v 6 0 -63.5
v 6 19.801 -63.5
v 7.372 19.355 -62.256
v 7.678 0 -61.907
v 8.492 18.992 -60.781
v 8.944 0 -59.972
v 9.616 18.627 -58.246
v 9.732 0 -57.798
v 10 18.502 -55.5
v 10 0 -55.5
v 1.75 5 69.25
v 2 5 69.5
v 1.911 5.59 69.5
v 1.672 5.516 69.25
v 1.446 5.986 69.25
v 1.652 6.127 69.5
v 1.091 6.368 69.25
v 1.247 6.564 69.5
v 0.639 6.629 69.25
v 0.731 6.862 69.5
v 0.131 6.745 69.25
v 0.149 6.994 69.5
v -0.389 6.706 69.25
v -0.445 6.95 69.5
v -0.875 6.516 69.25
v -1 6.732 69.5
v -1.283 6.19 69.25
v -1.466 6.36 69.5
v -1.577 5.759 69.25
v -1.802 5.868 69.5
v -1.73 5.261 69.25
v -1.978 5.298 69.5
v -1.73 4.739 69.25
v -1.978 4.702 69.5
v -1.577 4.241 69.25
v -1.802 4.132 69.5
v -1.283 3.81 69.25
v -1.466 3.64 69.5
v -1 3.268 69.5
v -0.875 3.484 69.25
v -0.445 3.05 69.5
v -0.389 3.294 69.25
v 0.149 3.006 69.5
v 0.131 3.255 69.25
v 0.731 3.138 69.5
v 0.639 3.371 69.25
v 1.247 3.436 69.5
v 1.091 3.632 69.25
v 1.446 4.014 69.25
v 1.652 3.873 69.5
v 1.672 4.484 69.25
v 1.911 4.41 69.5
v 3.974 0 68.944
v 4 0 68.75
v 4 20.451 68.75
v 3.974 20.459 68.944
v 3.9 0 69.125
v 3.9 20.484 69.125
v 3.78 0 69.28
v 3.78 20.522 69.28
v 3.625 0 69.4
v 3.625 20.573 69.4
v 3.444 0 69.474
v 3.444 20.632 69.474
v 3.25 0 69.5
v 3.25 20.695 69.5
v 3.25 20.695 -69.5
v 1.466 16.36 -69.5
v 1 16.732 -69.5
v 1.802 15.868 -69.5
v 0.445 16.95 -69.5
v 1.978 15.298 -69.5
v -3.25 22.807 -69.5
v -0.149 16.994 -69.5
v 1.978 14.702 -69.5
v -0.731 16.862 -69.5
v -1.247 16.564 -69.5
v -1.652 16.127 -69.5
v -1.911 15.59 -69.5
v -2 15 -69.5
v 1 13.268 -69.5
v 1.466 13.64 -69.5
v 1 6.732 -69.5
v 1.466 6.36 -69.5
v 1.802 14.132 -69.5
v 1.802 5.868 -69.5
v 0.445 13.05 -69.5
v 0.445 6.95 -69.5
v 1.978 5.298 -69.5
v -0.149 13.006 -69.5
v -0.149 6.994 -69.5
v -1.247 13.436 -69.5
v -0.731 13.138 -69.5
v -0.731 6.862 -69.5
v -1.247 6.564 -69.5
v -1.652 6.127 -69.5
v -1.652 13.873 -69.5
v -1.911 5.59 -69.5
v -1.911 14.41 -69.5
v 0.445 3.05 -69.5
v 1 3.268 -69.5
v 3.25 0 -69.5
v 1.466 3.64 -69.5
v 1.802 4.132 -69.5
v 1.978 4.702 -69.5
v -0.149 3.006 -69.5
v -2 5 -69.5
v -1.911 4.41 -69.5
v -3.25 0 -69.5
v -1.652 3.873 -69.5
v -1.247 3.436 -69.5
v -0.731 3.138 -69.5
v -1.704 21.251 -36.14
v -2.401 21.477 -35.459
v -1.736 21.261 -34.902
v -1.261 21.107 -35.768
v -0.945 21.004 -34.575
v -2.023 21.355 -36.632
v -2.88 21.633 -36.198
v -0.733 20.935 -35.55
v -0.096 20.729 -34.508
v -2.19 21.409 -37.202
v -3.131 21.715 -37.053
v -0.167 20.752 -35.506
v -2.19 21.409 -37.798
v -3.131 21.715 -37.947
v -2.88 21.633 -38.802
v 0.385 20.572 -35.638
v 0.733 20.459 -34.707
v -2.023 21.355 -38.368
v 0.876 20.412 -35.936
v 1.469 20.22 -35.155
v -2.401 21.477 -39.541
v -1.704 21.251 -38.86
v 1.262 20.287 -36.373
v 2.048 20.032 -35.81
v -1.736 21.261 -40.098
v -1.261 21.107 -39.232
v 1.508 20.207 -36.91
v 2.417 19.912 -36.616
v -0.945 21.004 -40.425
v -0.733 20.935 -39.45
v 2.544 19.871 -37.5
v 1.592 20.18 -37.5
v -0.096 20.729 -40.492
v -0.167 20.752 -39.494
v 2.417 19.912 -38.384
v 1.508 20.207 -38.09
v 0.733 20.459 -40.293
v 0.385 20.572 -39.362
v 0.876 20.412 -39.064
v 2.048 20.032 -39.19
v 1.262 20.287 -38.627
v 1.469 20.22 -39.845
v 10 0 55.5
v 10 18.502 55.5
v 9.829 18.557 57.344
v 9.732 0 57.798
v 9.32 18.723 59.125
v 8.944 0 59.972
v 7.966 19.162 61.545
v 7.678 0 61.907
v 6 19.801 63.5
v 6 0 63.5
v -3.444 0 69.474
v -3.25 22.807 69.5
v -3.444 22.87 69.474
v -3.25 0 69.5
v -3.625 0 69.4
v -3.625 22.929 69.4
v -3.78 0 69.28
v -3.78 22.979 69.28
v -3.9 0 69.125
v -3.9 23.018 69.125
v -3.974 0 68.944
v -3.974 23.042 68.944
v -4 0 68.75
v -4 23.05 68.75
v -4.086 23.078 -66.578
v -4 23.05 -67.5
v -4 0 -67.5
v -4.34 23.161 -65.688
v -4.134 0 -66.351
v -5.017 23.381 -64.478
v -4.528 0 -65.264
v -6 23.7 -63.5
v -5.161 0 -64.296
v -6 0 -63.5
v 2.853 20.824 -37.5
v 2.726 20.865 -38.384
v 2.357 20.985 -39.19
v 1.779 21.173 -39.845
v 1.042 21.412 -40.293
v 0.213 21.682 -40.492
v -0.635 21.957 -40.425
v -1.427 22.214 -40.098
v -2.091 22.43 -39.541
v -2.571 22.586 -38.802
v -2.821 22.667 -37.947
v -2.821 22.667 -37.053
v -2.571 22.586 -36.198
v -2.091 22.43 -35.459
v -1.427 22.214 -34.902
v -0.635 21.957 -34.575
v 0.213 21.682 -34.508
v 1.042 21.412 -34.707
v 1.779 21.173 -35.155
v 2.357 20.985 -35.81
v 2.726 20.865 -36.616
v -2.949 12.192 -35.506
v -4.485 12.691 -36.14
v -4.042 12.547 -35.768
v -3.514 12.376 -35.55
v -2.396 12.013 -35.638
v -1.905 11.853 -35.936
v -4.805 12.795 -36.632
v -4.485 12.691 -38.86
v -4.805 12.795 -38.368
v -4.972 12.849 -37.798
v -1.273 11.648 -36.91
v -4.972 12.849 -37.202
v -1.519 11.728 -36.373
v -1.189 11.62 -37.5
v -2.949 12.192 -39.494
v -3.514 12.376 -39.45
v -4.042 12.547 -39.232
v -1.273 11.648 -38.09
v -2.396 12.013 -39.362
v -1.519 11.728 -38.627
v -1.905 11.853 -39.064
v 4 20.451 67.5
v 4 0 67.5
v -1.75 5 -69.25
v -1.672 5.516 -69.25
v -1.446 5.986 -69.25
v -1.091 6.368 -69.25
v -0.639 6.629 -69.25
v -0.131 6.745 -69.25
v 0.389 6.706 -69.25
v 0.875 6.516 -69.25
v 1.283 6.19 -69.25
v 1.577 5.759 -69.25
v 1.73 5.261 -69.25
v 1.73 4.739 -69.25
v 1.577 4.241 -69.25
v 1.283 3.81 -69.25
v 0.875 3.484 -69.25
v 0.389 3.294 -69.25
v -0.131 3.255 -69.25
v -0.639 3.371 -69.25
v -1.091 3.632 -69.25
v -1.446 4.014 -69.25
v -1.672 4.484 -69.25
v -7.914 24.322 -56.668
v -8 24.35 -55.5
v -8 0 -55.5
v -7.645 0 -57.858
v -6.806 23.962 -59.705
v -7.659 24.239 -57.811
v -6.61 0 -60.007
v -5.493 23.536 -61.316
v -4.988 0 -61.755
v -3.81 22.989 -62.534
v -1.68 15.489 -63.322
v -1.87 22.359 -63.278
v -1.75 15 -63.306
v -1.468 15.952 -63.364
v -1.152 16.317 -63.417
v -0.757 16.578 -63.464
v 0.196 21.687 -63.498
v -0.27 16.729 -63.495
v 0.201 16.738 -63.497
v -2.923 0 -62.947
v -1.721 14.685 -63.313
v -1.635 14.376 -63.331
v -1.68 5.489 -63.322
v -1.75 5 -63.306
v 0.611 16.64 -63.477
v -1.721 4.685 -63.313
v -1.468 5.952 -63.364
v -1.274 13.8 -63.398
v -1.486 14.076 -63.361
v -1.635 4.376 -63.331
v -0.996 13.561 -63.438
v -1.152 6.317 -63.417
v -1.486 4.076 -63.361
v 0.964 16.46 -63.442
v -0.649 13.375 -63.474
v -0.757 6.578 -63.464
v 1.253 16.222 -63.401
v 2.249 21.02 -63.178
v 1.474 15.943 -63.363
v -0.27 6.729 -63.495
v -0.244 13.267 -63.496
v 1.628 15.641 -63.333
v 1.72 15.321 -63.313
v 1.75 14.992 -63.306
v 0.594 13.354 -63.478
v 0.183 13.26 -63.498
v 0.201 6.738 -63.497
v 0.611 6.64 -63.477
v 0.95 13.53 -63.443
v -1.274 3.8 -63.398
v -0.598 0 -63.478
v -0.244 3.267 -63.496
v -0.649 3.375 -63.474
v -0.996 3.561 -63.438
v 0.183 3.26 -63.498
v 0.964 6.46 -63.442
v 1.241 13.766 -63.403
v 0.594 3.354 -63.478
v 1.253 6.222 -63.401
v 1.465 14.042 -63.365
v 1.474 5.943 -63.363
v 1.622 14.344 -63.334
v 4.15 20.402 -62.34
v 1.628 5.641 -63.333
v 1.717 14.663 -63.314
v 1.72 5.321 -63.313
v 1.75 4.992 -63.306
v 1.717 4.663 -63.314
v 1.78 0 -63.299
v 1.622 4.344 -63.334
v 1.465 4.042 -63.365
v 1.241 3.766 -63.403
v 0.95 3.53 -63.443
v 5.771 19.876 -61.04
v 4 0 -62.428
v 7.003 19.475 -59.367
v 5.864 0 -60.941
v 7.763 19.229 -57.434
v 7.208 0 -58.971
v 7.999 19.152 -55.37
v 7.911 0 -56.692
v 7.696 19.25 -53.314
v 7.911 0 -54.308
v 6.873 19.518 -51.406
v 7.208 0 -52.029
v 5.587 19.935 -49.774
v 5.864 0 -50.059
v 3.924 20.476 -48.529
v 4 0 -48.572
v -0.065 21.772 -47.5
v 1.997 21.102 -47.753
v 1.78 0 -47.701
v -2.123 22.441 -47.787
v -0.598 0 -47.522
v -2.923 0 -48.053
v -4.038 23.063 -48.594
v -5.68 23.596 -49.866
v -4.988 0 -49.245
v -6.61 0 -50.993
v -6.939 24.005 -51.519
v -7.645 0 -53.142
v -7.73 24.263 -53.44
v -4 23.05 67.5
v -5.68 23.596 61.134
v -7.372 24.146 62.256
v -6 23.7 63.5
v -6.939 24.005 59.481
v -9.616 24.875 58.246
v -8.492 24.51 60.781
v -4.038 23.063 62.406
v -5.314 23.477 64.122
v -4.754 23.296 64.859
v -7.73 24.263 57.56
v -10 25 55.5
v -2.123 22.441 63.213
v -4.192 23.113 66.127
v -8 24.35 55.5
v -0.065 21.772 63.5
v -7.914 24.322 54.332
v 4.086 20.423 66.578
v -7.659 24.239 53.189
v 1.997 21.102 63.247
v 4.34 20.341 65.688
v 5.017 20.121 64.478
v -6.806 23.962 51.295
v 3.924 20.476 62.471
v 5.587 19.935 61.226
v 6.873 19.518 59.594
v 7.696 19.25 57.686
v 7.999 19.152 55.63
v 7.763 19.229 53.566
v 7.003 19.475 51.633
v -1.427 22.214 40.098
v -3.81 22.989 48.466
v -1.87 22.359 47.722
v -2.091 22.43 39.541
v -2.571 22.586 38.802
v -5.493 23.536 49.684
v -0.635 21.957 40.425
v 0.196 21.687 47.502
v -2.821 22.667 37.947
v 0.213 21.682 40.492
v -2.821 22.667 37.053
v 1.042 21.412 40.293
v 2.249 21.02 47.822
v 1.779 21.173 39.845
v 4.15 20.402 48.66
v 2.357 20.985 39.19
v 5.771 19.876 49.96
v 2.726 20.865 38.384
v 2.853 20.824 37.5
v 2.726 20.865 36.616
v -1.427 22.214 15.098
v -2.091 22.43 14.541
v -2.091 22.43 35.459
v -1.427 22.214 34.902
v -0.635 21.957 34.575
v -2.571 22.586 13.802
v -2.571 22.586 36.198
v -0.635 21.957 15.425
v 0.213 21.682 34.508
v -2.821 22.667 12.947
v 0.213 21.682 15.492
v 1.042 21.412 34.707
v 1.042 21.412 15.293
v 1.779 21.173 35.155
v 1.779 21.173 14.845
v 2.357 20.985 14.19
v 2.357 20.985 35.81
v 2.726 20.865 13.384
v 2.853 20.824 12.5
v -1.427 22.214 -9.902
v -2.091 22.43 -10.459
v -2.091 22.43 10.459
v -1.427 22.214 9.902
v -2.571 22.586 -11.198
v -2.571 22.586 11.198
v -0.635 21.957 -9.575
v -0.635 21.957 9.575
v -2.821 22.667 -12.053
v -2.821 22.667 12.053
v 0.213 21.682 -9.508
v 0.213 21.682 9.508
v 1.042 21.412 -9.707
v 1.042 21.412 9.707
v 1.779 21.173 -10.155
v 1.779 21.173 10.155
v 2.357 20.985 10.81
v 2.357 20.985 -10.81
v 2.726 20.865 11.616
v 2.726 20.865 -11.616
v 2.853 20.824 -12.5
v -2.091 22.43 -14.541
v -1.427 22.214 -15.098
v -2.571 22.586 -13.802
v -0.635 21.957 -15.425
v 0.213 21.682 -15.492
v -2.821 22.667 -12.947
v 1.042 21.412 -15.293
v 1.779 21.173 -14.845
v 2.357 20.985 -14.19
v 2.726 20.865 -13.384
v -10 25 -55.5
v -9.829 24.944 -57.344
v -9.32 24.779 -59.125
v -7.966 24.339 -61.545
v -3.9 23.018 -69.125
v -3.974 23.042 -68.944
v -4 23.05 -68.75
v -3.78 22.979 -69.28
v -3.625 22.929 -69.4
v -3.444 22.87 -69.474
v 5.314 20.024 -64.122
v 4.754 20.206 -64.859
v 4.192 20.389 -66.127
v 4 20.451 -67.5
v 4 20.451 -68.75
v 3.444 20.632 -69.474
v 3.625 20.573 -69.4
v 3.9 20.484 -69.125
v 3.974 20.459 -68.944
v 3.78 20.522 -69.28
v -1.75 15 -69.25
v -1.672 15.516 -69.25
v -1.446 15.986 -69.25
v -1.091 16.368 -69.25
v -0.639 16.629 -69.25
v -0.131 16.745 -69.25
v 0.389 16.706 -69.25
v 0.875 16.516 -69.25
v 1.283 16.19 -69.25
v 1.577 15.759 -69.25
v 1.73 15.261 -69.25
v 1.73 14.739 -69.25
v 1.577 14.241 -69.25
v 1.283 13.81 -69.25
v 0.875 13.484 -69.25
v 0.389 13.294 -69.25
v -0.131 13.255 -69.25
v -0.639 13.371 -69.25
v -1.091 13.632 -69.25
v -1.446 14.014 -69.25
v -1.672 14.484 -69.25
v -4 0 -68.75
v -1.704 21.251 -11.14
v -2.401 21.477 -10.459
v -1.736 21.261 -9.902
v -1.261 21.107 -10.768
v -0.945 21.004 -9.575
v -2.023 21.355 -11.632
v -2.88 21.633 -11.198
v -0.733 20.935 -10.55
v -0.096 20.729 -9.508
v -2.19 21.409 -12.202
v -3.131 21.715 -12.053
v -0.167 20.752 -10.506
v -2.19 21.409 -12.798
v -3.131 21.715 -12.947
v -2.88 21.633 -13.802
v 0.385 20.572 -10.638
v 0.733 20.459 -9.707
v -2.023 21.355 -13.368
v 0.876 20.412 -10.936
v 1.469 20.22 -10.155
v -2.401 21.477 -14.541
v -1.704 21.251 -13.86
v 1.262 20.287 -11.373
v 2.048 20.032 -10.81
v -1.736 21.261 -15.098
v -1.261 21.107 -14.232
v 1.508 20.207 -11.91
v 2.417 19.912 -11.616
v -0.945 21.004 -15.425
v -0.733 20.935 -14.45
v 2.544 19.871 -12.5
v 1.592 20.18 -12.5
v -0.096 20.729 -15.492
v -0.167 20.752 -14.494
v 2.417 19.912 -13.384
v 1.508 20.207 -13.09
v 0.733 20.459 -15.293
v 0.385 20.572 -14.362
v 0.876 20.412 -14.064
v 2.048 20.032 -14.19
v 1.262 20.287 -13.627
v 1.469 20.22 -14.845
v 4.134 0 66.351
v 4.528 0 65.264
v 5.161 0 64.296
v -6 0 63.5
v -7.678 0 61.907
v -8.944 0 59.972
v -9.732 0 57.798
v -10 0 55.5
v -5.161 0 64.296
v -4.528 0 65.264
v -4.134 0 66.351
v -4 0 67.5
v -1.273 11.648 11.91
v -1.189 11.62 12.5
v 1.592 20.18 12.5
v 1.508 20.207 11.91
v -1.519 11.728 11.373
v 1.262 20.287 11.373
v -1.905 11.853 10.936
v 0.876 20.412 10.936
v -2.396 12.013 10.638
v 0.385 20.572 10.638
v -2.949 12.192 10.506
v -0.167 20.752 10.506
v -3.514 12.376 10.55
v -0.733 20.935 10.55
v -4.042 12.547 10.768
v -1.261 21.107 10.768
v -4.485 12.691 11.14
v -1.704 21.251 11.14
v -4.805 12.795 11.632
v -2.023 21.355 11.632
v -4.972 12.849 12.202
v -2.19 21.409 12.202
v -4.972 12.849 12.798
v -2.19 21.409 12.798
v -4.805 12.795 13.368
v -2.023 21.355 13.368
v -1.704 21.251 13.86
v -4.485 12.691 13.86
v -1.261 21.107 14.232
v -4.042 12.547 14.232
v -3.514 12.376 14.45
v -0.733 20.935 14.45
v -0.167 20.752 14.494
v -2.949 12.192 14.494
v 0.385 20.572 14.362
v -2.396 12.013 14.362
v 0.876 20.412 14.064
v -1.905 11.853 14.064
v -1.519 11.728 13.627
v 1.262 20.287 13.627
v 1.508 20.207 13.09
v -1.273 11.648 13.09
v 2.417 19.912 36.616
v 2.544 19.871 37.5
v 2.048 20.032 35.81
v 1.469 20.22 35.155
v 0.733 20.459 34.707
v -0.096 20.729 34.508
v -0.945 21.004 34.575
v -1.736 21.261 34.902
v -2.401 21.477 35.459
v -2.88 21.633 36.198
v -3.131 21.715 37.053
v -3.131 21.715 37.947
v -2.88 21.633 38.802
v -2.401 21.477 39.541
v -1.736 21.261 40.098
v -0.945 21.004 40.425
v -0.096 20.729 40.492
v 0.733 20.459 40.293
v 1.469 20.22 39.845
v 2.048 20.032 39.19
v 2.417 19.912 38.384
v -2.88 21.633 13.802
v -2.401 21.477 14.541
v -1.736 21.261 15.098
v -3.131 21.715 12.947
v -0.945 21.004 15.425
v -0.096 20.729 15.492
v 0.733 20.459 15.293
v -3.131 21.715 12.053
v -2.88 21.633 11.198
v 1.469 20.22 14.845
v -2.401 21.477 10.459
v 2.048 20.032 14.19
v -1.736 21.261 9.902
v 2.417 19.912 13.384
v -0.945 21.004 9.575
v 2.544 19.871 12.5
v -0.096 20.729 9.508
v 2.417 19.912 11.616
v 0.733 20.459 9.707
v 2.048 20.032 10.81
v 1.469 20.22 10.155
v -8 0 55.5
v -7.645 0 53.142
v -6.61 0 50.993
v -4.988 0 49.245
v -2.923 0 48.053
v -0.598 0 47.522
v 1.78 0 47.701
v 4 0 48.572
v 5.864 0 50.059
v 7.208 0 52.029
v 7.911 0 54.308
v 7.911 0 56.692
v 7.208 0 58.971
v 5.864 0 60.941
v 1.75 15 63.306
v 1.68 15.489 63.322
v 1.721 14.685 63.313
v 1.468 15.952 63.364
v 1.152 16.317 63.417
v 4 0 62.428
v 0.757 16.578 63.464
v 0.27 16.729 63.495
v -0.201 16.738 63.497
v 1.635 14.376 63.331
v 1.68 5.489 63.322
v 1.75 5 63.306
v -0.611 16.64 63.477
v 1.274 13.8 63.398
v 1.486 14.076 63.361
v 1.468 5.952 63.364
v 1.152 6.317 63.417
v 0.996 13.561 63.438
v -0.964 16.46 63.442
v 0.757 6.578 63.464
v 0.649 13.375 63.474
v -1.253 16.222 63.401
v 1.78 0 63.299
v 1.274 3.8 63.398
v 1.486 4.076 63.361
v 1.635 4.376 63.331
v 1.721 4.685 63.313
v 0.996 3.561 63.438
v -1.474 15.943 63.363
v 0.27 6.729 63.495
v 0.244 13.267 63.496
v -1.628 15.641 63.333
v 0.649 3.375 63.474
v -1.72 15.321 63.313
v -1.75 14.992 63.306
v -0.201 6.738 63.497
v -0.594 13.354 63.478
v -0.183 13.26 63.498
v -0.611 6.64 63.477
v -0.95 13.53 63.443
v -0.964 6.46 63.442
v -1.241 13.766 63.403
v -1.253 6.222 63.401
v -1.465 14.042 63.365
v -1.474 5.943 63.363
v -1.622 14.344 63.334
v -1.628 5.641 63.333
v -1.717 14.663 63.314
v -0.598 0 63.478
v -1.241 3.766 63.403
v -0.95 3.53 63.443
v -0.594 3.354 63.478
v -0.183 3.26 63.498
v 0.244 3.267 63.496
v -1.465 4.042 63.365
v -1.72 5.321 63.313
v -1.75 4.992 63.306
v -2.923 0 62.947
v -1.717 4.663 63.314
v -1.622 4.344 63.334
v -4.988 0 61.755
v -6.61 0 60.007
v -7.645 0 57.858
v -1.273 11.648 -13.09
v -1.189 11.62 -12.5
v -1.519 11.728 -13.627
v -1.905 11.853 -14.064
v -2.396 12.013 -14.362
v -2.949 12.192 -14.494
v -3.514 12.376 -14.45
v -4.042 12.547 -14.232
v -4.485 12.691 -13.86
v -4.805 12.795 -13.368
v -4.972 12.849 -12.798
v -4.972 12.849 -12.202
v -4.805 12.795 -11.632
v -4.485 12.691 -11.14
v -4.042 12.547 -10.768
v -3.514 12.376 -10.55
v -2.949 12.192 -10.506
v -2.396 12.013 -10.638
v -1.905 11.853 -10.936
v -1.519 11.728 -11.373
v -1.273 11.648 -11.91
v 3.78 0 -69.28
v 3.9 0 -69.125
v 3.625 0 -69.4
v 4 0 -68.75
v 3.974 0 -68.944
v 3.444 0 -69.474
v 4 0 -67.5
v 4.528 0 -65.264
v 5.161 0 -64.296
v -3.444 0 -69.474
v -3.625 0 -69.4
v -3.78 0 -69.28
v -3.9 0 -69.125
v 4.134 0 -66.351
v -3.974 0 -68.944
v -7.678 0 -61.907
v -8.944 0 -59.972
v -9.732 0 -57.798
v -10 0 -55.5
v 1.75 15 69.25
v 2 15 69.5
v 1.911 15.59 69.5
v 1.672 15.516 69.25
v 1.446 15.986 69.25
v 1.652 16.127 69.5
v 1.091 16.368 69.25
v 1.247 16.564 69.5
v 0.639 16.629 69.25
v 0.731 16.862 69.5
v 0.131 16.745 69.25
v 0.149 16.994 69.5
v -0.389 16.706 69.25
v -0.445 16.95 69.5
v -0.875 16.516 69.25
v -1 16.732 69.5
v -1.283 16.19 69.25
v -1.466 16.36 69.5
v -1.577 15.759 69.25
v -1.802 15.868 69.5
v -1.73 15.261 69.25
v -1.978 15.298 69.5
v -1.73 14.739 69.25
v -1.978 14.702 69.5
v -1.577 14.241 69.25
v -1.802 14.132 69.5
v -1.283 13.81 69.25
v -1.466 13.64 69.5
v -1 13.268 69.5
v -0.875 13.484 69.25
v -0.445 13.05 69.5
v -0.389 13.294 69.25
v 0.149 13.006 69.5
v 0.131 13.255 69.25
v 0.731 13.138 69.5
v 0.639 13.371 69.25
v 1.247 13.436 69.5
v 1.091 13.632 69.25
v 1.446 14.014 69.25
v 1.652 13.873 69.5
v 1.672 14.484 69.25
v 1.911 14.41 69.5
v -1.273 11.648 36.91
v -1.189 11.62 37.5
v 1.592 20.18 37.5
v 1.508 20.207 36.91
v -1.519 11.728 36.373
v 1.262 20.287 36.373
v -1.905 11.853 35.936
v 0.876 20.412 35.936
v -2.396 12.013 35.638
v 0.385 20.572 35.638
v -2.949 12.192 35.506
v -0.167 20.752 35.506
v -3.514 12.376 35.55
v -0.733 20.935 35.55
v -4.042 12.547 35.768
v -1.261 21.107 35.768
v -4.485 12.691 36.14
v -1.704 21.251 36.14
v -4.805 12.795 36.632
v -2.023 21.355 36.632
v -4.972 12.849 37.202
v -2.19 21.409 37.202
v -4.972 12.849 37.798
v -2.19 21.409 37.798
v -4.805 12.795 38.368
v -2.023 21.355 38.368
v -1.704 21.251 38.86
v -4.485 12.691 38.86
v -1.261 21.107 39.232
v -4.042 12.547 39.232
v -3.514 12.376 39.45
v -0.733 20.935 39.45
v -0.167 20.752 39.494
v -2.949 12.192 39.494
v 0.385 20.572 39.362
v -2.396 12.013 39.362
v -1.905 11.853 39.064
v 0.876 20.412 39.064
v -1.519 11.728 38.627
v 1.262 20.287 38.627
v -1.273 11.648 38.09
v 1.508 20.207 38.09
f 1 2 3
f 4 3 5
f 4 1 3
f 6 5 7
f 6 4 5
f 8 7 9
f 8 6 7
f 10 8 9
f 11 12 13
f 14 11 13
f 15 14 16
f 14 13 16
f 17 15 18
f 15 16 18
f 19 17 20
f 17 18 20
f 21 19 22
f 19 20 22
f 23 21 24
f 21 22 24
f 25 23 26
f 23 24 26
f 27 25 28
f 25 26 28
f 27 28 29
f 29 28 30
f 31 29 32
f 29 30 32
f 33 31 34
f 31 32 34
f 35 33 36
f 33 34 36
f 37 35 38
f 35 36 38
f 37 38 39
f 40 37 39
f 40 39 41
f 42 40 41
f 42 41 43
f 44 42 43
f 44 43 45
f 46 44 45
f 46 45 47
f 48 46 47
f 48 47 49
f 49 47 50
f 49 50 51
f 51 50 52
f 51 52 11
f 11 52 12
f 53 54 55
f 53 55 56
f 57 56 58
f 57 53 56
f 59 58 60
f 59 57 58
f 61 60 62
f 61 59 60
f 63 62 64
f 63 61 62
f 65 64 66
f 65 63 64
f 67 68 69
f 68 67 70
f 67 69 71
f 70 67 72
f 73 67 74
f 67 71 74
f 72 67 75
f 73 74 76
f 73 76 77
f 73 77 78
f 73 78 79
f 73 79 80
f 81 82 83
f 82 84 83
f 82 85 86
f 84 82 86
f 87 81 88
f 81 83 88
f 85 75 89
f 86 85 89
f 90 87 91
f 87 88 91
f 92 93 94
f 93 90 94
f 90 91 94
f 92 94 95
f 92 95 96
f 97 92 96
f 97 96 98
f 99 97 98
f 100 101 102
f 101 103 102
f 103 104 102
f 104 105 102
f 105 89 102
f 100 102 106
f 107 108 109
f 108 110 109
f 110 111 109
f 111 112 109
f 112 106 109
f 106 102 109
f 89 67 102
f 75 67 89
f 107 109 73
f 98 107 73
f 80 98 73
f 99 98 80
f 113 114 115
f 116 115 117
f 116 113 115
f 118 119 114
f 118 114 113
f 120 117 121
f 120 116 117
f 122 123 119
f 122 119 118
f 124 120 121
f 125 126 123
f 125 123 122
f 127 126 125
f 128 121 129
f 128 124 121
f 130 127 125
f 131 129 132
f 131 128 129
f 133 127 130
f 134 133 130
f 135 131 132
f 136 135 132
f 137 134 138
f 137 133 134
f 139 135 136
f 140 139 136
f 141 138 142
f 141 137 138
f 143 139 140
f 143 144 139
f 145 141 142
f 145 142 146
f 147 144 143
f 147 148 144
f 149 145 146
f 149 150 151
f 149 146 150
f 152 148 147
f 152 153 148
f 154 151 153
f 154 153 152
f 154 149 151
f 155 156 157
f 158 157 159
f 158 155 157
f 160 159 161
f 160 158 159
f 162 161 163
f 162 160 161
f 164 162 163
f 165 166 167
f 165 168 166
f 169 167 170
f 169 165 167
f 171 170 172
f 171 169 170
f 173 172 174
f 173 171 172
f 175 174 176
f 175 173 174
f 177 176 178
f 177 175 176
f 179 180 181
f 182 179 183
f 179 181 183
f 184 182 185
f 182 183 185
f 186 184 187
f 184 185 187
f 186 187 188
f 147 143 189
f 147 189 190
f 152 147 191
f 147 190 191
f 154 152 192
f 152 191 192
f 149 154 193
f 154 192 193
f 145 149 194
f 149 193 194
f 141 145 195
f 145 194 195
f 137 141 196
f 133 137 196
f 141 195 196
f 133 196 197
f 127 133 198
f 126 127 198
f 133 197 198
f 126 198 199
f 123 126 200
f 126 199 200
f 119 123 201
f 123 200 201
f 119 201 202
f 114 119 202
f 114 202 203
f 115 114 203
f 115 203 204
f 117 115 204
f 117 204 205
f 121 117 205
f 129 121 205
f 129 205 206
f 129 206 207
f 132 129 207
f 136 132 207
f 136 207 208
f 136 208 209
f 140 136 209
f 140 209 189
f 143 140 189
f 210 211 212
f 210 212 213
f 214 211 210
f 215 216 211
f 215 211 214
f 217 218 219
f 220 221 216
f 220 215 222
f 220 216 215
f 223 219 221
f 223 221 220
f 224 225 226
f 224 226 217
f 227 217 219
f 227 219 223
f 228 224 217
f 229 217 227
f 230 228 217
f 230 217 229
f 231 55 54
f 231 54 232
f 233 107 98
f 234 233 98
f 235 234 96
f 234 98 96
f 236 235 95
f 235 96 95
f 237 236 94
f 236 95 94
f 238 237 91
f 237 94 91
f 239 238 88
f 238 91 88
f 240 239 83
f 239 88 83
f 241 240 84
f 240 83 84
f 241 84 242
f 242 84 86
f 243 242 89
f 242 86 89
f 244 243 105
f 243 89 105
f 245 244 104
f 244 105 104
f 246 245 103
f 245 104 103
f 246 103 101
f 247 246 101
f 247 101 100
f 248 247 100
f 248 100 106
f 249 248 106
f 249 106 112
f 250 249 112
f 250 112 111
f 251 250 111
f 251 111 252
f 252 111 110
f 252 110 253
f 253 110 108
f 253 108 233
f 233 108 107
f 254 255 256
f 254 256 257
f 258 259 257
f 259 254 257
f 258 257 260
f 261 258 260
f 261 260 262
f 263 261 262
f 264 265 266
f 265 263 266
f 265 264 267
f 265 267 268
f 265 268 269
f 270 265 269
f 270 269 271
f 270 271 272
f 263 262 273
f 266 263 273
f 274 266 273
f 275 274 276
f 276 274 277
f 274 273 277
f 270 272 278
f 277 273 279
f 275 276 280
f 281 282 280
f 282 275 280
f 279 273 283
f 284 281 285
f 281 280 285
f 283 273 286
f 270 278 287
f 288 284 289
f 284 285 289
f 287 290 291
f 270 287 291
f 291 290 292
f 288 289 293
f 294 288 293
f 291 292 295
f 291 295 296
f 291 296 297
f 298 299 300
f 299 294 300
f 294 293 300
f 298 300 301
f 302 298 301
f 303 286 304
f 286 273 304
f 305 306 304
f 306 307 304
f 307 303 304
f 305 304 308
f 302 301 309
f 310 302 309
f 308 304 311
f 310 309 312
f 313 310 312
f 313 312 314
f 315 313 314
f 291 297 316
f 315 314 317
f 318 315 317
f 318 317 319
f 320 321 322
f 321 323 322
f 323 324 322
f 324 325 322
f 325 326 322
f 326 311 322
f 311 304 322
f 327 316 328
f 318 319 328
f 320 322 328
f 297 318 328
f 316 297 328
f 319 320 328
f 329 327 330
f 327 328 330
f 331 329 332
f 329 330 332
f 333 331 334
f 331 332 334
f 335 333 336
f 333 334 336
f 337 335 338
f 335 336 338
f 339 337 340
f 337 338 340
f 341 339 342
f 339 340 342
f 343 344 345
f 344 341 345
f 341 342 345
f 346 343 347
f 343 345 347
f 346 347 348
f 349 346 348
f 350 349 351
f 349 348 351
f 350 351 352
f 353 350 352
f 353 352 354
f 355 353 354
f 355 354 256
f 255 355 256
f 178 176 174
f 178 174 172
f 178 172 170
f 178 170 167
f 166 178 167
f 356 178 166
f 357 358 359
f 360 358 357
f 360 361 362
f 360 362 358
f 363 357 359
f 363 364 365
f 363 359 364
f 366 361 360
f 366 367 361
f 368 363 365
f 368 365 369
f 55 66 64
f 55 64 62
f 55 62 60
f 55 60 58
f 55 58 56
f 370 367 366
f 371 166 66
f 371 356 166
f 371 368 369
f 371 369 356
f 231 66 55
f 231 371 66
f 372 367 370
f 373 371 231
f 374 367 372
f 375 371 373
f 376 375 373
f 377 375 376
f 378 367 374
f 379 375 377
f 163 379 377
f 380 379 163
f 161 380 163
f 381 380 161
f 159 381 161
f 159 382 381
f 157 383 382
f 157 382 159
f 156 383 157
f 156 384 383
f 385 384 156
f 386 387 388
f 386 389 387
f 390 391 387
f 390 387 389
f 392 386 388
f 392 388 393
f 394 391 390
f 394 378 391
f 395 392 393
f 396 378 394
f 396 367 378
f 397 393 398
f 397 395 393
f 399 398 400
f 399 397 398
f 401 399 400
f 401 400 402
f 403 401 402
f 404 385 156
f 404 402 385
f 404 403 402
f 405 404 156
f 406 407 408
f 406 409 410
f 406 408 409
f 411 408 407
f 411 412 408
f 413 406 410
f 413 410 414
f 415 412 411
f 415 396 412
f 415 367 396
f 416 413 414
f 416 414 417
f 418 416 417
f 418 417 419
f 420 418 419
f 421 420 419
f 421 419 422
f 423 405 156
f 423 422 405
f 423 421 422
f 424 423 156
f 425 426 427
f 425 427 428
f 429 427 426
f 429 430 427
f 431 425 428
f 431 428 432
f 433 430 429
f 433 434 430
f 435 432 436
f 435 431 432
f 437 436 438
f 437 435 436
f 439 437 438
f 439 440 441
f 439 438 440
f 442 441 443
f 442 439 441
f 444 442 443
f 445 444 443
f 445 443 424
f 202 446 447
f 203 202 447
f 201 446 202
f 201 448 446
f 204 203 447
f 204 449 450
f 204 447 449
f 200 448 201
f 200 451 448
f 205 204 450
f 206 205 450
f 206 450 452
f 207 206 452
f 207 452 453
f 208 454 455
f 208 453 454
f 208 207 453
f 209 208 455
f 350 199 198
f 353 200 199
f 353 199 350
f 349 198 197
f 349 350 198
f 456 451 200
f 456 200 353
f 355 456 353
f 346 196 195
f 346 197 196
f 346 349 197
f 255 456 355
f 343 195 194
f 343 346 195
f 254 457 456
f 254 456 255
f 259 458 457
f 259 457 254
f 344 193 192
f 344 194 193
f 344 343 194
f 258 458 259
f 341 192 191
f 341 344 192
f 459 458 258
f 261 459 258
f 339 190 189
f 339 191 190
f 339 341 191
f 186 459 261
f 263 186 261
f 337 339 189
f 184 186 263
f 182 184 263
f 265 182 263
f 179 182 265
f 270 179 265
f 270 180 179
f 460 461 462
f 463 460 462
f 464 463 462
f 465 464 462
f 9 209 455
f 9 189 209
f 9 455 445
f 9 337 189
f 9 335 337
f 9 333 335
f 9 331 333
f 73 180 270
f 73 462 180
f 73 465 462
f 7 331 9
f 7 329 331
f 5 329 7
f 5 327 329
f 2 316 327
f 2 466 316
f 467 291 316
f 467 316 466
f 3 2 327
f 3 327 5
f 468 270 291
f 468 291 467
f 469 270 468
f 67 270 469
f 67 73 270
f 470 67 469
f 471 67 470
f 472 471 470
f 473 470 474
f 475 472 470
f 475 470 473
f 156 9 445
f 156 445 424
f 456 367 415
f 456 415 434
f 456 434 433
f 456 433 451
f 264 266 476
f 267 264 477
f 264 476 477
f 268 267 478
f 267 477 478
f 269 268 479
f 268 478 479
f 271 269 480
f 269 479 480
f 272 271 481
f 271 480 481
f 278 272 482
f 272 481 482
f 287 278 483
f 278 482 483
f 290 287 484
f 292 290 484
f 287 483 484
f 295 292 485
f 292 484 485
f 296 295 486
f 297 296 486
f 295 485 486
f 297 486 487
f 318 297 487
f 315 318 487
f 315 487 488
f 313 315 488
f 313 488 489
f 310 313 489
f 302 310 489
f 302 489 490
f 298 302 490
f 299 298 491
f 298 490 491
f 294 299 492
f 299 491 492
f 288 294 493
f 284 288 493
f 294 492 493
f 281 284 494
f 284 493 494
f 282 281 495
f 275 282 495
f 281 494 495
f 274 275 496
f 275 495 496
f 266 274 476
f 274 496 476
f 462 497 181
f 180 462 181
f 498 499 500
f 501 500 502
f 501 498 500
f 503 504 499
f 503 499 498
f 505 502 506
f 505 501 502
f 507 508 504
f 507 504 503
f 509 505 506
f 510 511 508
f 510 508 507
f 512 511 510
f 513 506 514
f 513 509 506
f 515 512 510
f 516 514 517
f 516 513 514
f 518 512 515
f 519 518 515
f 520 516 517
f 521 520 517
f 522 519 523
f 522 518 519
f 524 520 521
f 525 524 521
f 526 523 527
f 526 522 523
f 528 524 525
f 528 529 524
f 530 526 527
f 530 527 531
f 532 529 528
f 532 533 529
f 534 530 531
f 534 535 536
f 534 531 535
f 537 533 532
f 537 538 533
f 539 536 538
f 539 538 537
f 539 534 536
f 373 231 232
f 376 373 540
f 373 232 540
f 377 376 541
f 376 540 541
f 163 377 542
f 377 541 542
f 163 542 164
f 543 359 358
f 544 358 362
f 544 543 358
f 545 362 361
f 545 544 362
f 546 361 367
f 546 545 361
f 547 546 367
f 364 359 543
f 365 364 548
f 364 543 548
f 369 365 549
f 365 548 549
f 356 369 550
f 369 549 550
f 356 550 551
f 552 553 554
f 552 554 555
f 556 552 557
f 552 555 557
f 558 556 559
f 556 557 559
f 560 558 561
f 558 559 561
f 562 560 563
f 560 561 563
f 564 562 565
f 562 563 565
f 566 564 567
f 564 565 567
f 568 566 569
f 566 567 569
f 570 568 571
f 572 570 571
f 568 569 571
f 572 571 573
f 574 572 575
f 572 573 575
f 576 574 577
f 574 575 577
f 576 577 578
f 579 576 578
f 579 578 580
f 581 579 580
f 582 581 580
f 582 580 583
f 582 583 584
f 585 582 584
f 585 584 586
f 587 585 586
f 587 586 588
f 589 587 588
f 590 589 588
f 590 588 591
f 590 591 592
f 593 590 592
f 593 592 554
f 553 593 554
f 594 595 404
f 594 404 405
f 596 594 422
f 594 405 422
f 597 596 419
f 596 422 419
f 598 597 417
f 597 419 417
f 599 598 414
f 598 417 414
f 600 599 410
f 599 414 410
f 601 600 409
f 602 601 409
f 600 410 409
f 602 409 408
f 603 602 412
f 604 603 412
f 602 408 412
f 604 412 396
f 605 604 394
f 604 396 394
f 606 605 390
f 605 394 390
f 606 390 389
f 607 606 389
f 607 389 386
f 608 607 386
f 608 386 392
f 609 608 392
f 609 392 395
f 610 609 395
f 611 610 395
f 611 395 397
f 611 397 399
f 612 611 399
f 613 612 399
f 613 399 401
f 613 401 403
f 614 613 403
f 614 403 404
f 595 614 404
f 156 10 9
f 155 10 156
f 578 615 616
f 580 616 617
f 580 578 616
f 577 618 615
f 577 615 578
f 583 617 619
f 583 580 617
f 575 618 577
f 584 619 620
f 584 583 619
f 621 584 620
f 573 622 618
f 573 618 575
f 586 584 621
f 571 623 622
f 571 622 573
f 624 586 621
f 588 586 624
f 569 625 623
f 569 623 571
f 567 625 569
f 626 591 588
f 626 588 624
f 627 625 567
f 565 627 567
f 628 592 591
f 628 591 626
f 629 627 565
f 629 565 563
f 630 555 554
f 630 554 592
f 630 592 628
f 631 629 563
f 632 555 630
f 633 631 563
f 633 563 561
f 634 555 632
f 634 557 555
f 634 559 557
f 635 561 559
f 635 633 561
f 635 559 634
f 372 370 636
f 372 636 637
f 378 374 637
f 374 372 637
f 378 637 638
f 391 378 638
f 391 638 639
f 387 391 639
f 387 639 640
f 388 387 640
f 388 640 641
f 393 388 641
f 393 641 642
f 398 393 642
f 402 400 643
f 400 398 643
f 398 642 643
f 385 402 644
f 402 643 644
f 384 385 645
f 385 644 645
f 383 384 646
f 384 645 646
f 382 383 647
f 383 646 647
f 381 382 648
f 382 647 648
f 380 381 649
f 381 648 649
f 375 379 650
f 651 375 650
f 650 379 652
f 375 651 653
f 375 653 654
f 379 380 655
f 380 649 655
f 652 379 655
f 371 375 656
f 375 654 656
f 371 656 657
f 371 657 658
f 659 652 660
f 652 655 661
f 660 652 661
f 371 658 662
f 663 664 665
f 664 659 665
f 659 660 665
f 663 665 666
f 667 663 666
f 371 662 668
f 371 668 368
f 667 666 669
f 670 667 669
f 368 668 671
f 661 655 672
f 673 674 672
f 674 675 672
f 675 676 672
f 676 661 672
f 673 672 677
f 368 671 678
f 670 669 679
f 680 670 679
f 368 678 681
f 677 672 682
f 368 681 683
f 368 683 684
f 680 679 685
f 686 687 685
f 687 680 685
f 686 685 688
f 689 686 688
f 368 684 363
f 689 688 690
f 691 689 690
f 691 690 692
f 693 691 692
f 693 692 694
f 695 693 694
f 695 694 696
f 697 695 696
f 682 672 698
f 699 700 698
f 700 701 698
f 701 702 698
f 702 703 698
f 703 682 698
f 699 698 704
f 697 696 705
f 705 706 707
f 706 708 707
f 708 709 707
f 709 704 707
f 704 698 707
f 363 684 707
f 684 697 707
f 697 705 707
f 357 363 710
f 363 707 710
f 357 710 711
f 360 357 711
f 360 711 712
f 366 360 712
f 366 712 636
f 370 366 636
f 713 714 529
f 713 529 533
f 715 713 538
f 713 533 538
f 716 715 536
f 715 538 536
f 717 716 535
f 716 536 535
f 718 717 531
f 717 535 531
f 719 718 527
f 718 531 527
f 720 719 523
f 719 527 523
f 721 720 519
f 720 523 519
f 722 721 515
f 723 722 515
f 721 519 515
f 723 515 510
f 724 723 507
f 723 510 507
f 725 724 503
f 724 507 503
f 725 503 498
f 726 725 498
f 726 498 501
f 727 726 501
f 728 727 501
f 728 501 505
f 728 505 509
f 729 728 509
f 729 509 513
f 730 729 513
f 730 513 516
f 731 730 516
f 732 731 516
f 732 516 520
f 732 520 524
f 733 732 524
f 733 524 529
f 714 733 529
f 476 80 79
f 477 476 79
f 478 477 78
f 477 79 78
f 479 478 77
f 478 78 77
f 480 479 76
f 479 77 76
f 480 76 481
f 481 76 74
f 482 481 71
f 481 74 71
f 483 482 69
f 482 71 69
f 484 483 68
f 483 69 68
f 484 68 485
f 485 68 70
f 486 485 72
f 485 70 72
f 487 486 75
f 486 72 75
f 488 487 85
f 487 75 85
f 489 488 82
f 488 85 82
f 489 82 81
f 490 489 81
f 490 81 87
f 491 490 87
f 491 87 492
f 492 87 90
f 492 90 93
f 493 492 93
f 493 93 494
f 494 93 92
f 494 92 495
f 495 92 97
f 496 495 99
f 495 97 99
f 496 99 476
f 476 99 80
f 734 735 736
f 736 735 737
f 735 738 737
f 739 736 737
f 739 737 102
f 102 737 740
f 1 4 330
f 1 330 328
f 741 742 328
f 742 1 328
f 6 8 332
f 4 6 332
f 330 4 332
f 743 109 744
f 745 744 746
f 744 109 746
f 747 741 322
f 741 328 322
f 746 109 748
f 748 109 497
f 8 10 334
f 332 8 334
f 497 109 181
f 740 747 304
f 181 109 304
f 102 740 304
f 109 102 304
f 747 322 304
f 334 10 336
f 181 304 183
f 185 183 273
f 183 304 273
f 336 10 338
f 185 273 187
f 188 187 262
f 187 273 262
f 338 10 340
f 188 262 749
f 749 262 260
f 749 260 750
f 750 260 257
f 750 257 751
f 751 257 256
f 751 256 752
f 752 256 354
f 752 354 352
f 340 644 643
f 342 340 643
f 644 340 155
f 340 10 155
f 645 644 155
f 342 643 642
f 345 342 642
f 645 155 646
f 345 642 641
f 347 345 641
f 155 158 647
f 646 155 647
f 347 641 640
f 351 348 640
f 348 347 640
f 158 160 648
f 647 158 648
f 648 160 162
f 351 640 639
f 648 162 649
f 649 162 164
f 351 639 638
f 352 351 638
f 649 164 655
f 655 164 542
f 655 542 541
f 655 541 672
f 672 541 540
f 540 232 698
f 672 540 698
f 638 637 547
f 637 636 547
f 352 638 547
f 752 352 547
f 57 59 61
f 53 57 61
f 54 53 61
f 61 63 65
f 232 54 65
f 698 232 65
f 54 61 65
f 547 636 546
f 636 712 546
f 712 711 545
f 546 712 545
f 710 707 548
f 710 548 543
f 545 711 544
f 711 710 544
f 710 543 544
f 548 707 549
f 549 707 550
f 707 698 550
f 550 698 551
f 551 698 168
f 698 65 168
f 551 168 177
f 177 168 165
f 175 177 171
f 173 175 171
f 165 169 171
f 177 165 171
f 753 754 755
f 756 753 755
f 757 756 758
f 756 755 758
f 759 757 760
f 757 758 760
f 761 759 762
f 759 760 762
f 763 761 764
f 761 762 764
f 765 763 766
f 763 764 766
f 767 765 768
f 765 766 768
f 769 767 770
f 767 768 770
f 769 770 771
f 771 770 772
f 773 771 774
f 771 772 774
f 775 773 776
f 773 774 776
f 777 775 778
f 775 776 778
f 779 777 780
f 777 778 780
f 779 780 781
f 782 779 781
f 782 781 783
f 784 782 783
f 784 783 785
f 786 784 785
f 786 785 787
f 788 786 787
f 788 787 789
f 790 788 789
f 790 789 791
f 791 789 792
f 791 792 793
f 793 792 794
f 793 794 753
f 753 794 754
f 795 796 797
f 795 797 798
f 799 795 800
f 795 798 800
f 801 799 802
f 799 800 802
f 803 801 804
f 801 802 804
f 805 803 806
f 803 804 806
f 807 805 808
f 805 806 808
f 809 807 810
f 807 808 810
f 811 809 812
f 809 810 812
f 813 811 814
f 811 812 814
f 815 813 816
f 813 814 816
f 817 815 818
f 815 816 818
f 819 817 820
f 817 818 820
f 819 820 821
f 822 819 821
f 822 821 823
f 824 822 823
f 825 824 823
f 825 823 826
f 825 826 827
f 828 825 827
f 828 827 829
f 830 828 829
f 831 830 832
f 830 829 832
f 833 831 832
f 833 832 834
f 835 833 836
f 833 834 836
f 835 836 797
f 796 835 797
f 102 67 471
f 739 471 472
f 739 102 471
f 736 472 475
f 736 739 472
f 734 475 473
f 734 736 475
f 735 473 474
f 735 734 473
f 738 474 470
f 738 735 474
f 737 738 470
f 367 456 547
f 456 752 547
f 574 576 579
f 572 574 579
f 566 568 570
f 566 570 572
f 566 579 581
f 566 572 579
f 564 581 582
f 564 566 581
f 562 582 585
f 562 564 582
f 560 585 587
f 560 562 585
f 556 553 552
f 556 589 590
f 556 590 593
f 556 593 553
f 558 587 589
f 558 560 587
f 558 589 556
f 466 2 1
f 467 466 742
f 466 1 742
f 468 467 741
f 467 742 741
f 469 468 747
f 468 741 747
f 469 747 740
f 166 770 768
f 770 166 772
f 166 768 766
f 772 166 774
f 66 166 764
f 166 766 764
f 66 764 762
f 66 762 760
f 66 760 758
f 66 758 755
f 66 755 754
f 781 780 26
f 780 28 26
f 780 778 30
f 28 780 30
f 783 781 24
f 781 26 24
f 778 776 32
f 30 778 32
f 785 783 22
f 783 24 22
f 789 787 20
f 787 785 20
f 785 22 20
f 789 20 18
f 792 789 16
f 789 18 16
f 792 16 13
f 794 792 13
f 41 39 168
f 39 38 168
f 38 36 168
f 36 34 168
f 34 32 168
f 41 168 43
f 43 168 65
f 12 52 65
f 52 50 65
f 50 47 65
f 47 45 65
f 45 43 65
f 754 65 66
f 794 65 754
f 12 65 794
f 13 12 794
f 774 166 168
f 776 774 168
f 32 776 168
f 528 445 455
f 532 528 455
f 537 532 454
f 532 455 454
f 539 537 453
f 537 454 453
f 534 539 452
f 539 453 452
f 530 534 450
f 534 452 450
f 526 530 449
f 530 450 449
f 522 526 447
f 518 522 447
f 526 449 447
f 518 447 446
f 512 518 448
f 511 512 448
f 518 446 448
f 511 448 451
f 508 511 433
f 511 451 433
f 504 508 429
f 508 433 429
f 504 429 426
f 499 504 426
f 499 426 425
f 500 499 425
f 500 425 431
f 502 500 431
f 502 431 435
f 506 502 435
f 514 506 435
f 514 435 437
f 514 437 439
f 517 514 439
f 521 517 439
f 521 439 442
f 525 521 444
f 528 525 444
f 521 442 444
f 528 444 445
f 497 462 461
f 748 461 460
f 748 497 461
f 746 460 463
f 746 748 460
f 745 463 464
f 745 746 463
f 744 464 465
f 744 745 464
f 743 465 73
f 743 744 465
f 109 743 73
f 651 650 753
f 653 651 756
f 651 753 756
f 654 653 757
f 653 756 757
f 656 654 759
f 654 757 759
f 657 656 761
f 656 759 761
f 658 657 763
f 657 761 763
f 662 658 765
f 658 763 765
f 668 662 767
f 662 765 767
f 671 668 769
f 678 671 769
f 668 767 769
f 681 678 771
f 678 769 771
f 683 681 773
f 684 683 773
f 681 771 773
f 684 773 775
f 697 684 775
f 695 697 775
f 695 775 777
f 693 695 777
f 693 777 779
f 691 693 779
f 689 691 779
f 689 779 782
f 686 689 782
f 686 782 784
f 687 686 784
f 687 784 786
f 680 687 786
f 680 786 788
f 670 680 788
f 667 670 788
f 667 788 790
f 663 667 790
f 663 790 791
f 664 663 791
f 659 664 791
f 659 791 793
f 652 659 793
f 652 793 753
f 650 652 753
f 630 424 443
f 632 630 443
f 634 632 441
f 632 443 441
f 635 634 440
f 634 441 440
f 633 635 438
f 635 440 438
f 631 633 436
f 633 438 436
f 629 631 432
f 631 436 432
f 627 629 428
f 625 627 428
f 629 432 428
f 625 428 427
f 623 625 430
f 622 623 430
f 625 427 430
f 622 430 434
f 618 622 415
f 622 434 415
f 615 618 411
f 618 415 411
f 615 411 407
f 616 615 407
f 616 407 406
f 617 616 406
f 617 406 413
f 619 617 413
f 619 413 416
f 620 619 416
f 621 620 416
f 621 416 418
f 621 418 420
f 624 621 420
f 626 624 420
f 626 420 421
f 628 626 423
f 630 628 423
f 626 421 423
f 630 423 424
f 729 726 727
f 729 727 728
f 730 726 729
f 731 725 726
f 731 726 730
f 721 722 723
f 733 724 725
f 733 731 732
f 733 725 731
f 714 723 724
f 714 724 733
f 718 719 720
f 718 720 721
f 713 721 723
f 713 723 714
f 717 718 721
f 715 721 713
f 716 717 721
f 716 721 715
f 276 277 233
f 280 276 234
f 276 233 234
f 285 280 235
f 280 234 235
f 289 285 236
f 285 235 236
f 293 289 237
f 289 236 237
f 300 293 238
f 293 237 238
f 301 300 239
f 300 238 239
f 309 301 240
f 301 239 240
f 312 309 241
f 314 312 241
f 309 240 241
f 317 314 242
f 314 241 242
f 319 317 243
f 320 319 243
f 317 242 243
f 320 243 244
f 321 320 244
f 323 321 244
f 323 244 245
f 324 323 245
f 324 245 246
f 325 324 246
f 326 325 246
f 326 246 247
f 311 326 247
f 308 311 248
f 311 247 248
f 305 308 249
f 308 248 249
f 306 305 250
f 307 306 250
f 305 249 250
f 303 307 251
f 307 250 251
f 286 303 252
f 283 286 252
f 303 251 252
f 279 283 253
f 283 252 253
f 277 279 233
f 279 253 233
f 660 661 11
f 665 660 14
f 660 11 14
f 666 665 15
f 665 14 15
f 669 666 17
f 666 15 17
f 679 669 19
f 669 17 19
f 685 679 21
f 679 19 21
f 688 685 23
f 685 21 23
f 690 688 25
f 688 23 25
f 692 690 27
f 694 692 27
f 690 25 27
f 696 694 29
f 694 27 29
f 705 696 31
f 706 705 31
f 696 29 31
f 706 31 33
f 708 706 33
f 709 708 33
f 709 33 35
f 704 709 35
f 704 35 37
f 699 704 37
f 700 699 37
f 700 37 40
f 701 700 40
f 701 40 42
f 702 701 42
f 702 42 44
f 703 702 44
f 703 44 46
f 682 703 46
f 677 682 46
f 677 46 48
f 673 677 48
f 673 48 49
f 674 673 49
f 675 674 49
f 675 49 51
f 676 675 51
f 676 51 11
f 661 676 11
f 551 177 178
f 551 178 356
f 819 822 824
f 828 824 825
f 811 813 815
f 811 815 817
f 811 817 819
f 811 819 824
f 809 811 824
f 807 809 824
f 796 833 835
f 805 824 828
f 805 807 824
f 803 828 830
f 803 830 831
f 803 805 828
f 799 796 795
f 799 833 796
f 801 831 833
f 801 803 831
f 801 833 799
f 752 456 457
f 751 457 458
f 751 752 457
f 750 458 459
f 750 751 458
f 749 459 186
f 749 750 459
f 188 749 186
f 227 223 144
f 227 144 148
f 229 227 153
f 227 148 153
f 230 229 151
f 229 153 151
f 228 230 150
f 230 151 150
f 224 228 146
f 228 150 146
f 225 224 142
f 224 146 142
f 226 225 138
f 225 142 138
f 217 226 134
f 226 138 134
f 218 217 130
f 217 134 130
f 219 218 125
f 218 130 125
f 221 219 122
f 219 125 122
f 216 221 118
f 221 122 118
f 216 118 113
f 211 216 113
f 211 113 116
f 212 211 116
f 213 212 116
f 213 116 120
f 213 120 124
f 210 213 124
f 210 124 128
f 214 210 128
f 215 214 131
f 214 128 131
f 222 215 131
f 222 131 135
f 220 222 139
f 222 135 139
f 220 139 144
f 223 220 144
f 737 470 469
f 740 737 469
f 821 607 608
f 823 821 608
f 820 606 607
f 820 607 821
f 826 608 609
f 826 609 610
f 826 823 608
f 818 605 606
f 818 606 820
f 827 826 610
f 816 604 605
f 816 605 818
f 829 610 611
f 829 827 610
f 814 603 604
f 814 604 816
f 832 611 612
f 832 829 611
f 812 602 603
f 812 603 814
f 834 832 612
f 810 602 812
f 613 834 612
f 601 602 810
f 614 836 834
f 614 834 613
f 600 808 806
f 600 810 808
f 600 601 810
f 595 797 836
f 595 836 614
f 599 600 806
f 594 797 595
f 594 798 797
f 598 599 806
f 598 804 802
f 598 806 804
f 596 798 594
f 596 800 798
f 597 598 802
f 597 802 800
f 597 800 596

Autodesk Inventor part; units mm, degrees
ref_plane "YZ Plane" through (0, 0, 0) normal (1, 0, 0) x (0, 1, 0)
ref_plane "XZ Plane" through (0, 0, 0) normal (0, 1, 0) x (-1, 0, 0)
ref_plane "XY Plane" through (0, 0, 0) normal (0, 0, 1) x (1, 0, 0)
sketch "Sketch1" plane through (0, 0, 0) normal (0, 1, 0) x (-1, 0, 0)
  line L0 (0, 0) -> (0, -55.5) construction
  circle A0 centre (0, -55.5) radius 8
  line L1 (0, 0) -> (10, 0) construction
  line L2 (0, 0) -> (-10, 0) construction
  line L3 (10, -55.5) -> (10, 0)
  line L4 (-10, -55.5) -> (-10, 0)
  line L5 (0, 0) -> (0, -12.5) construction
  line L6 (0, -12.5) -> (0, -37.5) construction
  line L7 (0, -65.5) -> (0, -69.5) construction
  line L8 (0, -69.5) -> (3.25, -69.5)
  line L9 (4, -68.75) -> (4, -67.5)
  line L10 (0, -69.5) -> (-3.25, -69.5)
  line L11 (-4, -68.75) -> (-4, -67.5)
  arc A1 (-10, -55.5) -> (-6, -63.5) centre (0, -55.5) ccw
  arc A2 (6, -63.5) -> (10, -55.5) centre (0, -55.5) ccw
  arc A3 (6, -63.5) -> (4, -67.5) centre (9, -67.5) ccw
  arc A4 (-4, -67.5) -> (-6, -63.5) centre (-9, -67.5) ccw
  arc A5 (-4, -68.75) -> (-3.25, -69.5) centre (-3.25, -68.75) ccw
  arc A6 (3.25, -69.5) -> (4, -68.75) centre (3.25, -68.75) ccw
  line L12 (0, 0) -> (0, 55.5) construction
  circle A7 centre (0, 55.5) radius 8
  line L13 (10, 55.5) -> (10, 0)
  line L14 (-10, 55.5) -> (-10, 0)
  line L15 (0, 0) -> (0, 12.5) construction
  line L16 (0, 12.5) -> (0, 37.5) construction
  line L17 (0, 65.5) -> (0, 69.5) construction
  line L18 (0, 69.5) -> (3.25, 69.5)
  line L19 (4, 68.75) -> (4, 67.5)
  line L20 (0, 69.5) -> (-3.25, 69.5)
  line L21 (-4, 68.75) -> (-4, 67.5)
  arc A8 (-6, 63.5) -> (-10, 55.5) centre (0, 55.5) ccw
  arc A9 (10, 55.5) -> (6, 63.5) centre (0, 55.5) ccw
  arc A10 (4, 67.5) -> (6, 63.5) centre (9, 67.5) ccw
  arc A11 (-6, 63.5) -> (-4, 67.5) centre (-9, 67.5) ccw
  arc A12 (-3.25, 69.5) -> (-4, 68.75) centre (-3.25, 68.75) ccw
  arc A13 (4, 68.75) -> (3.25, 69.5) centre (3.25, 68.75) ccw
  point P0 (4, -69.5)
  point P1 (4, -64.6652)
  point P2 (-4, -69.5)
  point P3 (-4, -64.6652)
  point P4 (4, 69.5)
  point P5 (4, 64.6652)
  point P6 (-4, 69.5)
  point P7 (-4, 64.6652)
  dimension "d0" = 55.5
  dimension "d1" = 16
  dimension "d3" = 10
  dimension "d4" = 10
  dimension "d6" = 12.5
  dimension "d7" = 25
  dimension "d10" = 4
  dimension "d11" = 4
  dimension "d12" = 4
  dimension "d13" = 5
  dimension "d14" = 0.75
extrude "Extrusion1" add sketch "Sketch1" along normal blind 25
sketch "Sketch2" plane through (0, 0, 0) normal (0, 0, 1) x (1, 0, 0)
  line L0 (-10, 25) -> (10, 18.5016)
  line L1 (10, 0) -> (10, 25) projected
  line L2 (-10, 25) -> (11.0292, 25) construction
  line L3 (10, 18.5016) -> (10, 25)
  line L4 (10, 25) -> (-10, 25)
  point P0 (0, 0)
  dimension "d17" = 18
extrude "Extrusion2" cut sketch "Sketch2" along normal through all both and the other way through all
sketch "Sketch3" plane through (10, 18.5016, 55.5) normal (0.309, 0.9511, 0) x (0.9511, -0.309, 0)
  ellipse E0 centre (-10.5146, 0) end of major axis (-2.1029, 0) minor radius 8 projected
  ellipse E1 centre (-10.5146, 111) end of major axis (-2.1029, 111) minor radius 8 projected
  line L0 (-10.5146, 0) -> (-10.5146, 111) construction
  line L1 (-10.5146, 55.5) -> (-10.5146, 43)
  line L2 (-10.5146, 43) -> (-10.5146, 18)
  line L3 (-10.5146, 55.5) -> (-10.5146, 68)
  line L4 (-10.5146, 68) -> (-10.5146, 93)
  circle A0 centre (-10.5146, 18) radius 2
  circle A1 centre (-10.5146, 43) radius 2
  circle A2 centre (-10.5146, 68) radius 2
  circle A3 centre (-10.5146, 93) radius 2
  point P0 (-3.7933, 55.5)
  dimension "d20" = 12.5
  dimension "d21" = 25
  dimension "d22" = 12.5
  dimension "d23" = 25
  dimension "d24" = 4
  dimension "d25" = 4
  dimension "d26" = 4
  dimension "d27" = 4
extrude "Extrusion3" cut sketch "Sketch3" against normal blind 10 contours A0 | A1 L2 L1 | L1 L2 A1 | A3 | A2 L4 L3 | L3 L4 A2
sketch "Sketch4" plane through (10, 18.5016, 55.5) normal (0.309, 0.9511, 0) x (0.9511, -0.309, 0)
  circle A0 centre (-10.5146, 18) radius 2 projected
  circle A1 centre (-10.5146, 18) radius 3
  circle A2 centre (-10.5146, 43) radius 2 projected
  circle A3 centre (-10.5146, 43) radius 3
  circle A4 centre (-10.5146, 68) radius 2 projected
  circle A5 centre (-10.5146, 68) radius 3
  circle A6 centre (-10.5146, 93) radius 2 projected
  circle A7 centre (-10.5146, 93) radius 3
  point P0 (-3.7933, 55.5)
  dimension "d30" = 6
  dimension "d31" = 6
  dimension "d32" = 6
  dimension "d33" = 6
extrude "Extrusion4" cut sketch "Sketch4" against normal blind 1
sketch "Sketch5" plane through (-3.25, 0, 69.5) normal (0, 0, 1) x (1, 0, 0)
  line L0 (3.25, 0) -> (3.25, 5)
  line L1 (3.25, 5) -> (3.25, 15)
  circle A0 centre (3.25, 15) radius 1.75
  circle A1 centre (3.25, 5) radius 1.75
  dimension "d36" = 5
  dimension "d37" = 10
  dimension "d38" = 3.5
  dimension "d39" = 3.5
extrude "Extrusion5" cut sketch "Sketch5" against normal blind 7.5
sketch "Sketch6" plane through (3.25, 0, -69.5) normal (0, 0, -1) x (-1, 0, 0)
  line L0 (3.25, 0) -> (3.25, 5)
  line L1 (3.25, 5) -> (3.25, 15)
  circle A0 centre (3.25, 15) radius 1.75
  circle A1 centre (3.25, 5) radius 1.75
  dimension "d42" = 5
  dimension "d43" = 10
  dimension "d44" = 3.5
  dimension "d45" = 3.5
extrude "Extrusion6" cut sketch "Sketch6" against normal blind 7.5
chamfer "Chamfer1" distance 0.25 angle 45 4 edges at (1.75, 5, -69.5) (1.75, 15, -69.5) (-1.75, 15, 69.5) (-1.75, 5, 69.5)
properties part number "Leg_Battery_Connector"
